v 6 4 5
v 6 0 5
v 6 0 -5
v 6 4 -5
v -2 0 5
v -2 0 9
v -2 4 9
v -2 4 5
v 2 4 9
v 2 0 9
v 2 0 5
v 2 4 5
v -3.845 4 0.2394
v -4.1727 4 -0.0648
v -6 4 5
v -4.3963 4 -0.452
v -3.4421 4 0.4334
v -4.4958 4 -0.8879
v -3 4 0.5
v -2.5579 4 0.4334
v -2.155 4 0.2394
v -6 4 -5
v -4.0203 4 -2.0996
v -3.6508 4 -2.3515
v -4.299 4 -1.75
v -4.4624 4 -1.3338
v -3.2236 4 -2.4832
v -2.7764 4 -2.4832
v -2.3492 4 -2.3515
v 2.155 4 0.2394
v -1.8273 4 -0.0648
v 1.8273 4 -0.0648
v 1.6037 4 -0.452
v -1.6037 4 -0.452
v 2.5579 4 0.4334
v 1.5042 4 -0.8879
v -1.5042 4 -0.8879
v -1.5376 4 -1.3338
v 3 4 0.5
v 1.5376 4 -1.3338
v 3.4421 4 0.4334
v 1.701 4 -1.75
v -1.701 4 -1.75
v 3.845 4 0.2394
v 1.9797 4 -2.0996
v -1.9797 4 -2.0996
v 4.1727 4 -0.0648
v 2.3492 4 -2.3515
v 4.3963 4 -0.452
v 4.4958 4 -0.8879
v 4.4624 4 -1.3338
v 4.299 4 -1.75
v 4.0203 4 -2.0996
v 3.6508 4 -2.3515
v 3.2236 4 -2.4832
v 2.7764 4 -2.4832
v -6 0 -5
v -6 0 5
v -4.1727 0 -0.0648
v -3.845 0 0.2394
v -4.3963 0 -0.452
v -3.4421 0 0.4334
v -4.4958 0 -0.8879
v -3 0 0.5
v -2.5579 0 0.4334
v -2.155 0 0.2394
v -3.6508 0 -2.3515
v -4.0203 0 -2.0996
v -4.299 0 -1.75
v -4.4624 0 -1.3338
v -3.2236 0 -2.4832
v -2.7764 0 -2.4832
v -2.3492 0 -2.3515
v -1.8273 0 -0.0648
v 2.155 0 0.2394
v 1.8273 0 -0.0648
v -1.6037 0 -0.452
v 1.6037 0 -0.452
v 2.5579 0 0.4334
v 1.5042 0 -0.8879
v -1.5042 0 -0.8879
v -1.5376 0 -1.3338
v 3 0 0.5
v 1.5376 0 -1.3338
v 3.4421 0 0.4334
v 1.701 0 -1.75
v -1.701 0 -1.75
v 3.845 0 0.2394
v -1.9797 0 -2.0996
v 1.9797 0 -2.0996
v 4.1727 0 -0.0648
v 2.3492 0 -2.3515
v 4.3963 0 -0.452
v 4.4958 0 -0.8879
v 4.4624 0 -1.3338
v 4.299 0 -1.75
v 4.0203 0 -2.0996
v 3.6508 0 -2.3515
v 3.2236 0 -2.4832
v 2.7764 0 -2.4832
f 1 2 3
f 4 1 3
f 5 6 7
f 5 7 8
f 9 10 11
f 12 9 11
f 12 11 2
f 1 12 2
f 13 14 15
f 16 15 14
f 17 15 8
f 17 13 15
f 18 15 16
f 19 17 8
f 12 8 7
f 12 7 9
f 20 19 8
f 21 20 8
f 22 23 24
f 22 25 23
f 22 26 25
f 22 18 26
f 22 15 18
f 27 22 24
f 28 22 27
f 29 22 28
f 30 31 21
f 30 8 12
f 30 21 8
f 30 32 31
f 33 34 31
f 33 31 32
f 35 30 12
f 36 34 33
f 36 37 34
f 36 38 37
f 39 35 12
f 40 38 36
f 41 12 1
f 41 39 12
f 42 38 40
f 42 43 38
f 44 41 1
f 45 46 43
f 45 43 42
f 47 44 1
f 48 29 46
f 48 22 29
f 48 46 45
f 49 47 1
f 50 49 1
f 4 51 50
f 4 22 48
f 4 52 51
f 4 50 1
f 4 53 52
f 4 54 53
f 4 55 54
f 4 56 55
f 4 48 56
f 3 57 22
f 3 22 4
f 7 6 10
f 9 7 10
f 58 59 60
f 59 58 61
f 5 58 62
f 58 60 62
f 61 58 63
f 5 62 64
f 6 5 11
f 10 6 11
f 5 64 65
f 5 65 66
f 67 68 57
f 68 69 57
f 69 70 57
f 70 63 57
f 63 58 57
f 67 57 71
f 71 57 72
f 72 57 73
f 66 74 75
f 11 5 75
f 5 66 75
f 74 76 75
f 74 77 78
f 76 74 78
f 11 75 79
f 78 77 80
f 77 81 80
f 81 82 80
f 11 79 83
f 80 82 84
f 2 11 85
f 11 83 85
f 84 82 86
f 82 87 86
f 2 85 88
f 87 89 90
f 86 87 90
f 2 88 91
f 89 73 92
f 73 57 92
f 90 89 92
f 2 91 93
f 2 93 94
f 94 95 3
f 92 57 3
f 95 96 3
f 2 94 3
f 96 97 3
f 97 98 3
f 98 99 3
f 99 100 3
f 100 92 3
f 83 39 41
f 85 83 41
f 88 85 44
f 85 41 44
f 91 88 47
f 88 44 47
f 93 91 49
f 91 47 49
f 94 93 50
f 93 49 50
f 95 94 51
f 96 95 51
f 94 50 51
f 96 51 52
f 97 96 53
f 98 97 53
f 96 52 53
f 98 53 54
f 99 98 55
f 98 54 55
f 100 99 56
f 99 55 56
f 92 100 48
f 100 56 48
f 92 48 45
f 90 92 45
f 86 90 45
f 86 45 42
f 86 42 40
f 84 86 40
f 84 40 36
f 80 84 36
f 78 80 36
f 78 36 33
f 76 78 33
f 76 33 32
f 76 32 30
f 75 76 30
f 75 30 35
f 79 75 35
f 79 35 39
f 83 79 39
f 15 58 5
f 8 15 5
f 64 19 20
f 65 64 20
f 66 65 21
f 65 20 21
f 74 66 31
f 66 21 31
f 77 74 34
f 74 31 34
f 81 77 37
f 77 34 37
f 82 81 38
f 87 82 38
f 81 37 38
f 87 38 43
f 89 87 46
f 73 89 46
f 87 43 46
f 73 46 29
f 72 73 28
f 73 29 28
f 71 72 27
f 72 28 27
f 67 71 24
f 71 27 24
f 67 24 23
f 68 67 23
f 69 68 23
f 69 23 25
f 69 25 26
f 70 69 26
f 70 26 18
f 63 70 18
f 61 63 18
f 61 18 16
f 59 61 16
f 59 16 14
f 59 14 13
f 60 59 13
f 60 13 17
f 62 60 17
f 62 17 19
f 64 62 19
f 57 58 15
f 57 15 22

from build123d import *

# Parameters (mm, degrees)
SKETCH1_W           = 12
SKETCH1_H           = 10
SKETCH1_W_2         = 4
SKETCH1_H_2         = 4
BOSS_EXTRUDE1_DEPTH = 4
SKETCH2_R           = 1.5
CUT_EXTRUDE1_DEPTH  = 12.532562595


with BuildPart() as part:
    # Sketch1 → Boss-Extrude1 (new body)
    with BuildSketch(Plane(origin=(0, 0, 0), x_dir=(1, 0, 0), z_dir=(0, 1, 0))):
        Rectangle(SKETCH1_W, SKETCH1_H)
        with Locations((0, -7)):
            Rectangle(SKETCH1_W_2, SKETCH1_H_2)
    extrude(amount=BOSS_EXTRUDE1_DEPTH)

    # Sketch2 → Cut-Extrude1 (cut, through all)
    with BuildSketch(Plane(origin=(0, 4, 0), x_dir=(1, 0, 0), z_dir=(0, 1, 0))):
        with Locations(Location((-3, 1, 0), (0, 0, 270))):
            Circle(SKETCH2_R)
        with Locations(Location((3, 1, 0), (0, 0, 270))):
            Circle(SKETCH2_R)
    extrude(amount=-CUT_EXTRUDE1_DEPTH, mode=Mode.SUBTRACT)


solid = part.part
